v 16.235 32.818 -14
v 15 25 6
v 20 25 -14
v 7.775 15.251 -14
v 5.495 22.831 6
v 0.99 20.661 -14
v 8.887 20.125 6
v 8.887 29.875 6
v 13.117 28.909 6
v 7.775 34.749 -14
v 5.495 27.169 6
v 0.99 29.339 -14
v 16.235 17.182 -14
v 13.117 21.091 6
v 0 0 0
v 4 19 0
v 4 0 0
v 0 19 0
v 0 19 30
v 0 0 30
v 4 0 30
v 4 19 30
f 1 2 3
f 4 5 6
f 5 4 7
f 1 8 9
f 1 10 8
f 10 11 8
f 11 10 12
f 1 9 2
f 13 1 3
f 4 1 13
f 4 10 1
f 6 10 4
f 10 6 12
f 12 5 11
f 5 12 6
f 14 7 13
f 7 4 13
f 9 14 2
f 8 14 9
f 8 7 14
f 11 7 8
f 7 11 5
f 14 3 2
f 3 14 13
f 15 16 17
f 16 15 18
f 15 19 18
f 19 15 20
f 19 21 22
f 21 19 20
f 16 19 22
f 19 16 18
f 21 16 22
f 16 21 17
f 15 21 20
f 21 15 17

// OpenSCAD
x = 10;
y = 25;
z = -4;

//cylinder(r=10,h=4);
translate([x,y,z]) cylinder(h=20, r1=10,r2=5,center=true, $fn=7);

linear_extrude(30) square([4,19]);
